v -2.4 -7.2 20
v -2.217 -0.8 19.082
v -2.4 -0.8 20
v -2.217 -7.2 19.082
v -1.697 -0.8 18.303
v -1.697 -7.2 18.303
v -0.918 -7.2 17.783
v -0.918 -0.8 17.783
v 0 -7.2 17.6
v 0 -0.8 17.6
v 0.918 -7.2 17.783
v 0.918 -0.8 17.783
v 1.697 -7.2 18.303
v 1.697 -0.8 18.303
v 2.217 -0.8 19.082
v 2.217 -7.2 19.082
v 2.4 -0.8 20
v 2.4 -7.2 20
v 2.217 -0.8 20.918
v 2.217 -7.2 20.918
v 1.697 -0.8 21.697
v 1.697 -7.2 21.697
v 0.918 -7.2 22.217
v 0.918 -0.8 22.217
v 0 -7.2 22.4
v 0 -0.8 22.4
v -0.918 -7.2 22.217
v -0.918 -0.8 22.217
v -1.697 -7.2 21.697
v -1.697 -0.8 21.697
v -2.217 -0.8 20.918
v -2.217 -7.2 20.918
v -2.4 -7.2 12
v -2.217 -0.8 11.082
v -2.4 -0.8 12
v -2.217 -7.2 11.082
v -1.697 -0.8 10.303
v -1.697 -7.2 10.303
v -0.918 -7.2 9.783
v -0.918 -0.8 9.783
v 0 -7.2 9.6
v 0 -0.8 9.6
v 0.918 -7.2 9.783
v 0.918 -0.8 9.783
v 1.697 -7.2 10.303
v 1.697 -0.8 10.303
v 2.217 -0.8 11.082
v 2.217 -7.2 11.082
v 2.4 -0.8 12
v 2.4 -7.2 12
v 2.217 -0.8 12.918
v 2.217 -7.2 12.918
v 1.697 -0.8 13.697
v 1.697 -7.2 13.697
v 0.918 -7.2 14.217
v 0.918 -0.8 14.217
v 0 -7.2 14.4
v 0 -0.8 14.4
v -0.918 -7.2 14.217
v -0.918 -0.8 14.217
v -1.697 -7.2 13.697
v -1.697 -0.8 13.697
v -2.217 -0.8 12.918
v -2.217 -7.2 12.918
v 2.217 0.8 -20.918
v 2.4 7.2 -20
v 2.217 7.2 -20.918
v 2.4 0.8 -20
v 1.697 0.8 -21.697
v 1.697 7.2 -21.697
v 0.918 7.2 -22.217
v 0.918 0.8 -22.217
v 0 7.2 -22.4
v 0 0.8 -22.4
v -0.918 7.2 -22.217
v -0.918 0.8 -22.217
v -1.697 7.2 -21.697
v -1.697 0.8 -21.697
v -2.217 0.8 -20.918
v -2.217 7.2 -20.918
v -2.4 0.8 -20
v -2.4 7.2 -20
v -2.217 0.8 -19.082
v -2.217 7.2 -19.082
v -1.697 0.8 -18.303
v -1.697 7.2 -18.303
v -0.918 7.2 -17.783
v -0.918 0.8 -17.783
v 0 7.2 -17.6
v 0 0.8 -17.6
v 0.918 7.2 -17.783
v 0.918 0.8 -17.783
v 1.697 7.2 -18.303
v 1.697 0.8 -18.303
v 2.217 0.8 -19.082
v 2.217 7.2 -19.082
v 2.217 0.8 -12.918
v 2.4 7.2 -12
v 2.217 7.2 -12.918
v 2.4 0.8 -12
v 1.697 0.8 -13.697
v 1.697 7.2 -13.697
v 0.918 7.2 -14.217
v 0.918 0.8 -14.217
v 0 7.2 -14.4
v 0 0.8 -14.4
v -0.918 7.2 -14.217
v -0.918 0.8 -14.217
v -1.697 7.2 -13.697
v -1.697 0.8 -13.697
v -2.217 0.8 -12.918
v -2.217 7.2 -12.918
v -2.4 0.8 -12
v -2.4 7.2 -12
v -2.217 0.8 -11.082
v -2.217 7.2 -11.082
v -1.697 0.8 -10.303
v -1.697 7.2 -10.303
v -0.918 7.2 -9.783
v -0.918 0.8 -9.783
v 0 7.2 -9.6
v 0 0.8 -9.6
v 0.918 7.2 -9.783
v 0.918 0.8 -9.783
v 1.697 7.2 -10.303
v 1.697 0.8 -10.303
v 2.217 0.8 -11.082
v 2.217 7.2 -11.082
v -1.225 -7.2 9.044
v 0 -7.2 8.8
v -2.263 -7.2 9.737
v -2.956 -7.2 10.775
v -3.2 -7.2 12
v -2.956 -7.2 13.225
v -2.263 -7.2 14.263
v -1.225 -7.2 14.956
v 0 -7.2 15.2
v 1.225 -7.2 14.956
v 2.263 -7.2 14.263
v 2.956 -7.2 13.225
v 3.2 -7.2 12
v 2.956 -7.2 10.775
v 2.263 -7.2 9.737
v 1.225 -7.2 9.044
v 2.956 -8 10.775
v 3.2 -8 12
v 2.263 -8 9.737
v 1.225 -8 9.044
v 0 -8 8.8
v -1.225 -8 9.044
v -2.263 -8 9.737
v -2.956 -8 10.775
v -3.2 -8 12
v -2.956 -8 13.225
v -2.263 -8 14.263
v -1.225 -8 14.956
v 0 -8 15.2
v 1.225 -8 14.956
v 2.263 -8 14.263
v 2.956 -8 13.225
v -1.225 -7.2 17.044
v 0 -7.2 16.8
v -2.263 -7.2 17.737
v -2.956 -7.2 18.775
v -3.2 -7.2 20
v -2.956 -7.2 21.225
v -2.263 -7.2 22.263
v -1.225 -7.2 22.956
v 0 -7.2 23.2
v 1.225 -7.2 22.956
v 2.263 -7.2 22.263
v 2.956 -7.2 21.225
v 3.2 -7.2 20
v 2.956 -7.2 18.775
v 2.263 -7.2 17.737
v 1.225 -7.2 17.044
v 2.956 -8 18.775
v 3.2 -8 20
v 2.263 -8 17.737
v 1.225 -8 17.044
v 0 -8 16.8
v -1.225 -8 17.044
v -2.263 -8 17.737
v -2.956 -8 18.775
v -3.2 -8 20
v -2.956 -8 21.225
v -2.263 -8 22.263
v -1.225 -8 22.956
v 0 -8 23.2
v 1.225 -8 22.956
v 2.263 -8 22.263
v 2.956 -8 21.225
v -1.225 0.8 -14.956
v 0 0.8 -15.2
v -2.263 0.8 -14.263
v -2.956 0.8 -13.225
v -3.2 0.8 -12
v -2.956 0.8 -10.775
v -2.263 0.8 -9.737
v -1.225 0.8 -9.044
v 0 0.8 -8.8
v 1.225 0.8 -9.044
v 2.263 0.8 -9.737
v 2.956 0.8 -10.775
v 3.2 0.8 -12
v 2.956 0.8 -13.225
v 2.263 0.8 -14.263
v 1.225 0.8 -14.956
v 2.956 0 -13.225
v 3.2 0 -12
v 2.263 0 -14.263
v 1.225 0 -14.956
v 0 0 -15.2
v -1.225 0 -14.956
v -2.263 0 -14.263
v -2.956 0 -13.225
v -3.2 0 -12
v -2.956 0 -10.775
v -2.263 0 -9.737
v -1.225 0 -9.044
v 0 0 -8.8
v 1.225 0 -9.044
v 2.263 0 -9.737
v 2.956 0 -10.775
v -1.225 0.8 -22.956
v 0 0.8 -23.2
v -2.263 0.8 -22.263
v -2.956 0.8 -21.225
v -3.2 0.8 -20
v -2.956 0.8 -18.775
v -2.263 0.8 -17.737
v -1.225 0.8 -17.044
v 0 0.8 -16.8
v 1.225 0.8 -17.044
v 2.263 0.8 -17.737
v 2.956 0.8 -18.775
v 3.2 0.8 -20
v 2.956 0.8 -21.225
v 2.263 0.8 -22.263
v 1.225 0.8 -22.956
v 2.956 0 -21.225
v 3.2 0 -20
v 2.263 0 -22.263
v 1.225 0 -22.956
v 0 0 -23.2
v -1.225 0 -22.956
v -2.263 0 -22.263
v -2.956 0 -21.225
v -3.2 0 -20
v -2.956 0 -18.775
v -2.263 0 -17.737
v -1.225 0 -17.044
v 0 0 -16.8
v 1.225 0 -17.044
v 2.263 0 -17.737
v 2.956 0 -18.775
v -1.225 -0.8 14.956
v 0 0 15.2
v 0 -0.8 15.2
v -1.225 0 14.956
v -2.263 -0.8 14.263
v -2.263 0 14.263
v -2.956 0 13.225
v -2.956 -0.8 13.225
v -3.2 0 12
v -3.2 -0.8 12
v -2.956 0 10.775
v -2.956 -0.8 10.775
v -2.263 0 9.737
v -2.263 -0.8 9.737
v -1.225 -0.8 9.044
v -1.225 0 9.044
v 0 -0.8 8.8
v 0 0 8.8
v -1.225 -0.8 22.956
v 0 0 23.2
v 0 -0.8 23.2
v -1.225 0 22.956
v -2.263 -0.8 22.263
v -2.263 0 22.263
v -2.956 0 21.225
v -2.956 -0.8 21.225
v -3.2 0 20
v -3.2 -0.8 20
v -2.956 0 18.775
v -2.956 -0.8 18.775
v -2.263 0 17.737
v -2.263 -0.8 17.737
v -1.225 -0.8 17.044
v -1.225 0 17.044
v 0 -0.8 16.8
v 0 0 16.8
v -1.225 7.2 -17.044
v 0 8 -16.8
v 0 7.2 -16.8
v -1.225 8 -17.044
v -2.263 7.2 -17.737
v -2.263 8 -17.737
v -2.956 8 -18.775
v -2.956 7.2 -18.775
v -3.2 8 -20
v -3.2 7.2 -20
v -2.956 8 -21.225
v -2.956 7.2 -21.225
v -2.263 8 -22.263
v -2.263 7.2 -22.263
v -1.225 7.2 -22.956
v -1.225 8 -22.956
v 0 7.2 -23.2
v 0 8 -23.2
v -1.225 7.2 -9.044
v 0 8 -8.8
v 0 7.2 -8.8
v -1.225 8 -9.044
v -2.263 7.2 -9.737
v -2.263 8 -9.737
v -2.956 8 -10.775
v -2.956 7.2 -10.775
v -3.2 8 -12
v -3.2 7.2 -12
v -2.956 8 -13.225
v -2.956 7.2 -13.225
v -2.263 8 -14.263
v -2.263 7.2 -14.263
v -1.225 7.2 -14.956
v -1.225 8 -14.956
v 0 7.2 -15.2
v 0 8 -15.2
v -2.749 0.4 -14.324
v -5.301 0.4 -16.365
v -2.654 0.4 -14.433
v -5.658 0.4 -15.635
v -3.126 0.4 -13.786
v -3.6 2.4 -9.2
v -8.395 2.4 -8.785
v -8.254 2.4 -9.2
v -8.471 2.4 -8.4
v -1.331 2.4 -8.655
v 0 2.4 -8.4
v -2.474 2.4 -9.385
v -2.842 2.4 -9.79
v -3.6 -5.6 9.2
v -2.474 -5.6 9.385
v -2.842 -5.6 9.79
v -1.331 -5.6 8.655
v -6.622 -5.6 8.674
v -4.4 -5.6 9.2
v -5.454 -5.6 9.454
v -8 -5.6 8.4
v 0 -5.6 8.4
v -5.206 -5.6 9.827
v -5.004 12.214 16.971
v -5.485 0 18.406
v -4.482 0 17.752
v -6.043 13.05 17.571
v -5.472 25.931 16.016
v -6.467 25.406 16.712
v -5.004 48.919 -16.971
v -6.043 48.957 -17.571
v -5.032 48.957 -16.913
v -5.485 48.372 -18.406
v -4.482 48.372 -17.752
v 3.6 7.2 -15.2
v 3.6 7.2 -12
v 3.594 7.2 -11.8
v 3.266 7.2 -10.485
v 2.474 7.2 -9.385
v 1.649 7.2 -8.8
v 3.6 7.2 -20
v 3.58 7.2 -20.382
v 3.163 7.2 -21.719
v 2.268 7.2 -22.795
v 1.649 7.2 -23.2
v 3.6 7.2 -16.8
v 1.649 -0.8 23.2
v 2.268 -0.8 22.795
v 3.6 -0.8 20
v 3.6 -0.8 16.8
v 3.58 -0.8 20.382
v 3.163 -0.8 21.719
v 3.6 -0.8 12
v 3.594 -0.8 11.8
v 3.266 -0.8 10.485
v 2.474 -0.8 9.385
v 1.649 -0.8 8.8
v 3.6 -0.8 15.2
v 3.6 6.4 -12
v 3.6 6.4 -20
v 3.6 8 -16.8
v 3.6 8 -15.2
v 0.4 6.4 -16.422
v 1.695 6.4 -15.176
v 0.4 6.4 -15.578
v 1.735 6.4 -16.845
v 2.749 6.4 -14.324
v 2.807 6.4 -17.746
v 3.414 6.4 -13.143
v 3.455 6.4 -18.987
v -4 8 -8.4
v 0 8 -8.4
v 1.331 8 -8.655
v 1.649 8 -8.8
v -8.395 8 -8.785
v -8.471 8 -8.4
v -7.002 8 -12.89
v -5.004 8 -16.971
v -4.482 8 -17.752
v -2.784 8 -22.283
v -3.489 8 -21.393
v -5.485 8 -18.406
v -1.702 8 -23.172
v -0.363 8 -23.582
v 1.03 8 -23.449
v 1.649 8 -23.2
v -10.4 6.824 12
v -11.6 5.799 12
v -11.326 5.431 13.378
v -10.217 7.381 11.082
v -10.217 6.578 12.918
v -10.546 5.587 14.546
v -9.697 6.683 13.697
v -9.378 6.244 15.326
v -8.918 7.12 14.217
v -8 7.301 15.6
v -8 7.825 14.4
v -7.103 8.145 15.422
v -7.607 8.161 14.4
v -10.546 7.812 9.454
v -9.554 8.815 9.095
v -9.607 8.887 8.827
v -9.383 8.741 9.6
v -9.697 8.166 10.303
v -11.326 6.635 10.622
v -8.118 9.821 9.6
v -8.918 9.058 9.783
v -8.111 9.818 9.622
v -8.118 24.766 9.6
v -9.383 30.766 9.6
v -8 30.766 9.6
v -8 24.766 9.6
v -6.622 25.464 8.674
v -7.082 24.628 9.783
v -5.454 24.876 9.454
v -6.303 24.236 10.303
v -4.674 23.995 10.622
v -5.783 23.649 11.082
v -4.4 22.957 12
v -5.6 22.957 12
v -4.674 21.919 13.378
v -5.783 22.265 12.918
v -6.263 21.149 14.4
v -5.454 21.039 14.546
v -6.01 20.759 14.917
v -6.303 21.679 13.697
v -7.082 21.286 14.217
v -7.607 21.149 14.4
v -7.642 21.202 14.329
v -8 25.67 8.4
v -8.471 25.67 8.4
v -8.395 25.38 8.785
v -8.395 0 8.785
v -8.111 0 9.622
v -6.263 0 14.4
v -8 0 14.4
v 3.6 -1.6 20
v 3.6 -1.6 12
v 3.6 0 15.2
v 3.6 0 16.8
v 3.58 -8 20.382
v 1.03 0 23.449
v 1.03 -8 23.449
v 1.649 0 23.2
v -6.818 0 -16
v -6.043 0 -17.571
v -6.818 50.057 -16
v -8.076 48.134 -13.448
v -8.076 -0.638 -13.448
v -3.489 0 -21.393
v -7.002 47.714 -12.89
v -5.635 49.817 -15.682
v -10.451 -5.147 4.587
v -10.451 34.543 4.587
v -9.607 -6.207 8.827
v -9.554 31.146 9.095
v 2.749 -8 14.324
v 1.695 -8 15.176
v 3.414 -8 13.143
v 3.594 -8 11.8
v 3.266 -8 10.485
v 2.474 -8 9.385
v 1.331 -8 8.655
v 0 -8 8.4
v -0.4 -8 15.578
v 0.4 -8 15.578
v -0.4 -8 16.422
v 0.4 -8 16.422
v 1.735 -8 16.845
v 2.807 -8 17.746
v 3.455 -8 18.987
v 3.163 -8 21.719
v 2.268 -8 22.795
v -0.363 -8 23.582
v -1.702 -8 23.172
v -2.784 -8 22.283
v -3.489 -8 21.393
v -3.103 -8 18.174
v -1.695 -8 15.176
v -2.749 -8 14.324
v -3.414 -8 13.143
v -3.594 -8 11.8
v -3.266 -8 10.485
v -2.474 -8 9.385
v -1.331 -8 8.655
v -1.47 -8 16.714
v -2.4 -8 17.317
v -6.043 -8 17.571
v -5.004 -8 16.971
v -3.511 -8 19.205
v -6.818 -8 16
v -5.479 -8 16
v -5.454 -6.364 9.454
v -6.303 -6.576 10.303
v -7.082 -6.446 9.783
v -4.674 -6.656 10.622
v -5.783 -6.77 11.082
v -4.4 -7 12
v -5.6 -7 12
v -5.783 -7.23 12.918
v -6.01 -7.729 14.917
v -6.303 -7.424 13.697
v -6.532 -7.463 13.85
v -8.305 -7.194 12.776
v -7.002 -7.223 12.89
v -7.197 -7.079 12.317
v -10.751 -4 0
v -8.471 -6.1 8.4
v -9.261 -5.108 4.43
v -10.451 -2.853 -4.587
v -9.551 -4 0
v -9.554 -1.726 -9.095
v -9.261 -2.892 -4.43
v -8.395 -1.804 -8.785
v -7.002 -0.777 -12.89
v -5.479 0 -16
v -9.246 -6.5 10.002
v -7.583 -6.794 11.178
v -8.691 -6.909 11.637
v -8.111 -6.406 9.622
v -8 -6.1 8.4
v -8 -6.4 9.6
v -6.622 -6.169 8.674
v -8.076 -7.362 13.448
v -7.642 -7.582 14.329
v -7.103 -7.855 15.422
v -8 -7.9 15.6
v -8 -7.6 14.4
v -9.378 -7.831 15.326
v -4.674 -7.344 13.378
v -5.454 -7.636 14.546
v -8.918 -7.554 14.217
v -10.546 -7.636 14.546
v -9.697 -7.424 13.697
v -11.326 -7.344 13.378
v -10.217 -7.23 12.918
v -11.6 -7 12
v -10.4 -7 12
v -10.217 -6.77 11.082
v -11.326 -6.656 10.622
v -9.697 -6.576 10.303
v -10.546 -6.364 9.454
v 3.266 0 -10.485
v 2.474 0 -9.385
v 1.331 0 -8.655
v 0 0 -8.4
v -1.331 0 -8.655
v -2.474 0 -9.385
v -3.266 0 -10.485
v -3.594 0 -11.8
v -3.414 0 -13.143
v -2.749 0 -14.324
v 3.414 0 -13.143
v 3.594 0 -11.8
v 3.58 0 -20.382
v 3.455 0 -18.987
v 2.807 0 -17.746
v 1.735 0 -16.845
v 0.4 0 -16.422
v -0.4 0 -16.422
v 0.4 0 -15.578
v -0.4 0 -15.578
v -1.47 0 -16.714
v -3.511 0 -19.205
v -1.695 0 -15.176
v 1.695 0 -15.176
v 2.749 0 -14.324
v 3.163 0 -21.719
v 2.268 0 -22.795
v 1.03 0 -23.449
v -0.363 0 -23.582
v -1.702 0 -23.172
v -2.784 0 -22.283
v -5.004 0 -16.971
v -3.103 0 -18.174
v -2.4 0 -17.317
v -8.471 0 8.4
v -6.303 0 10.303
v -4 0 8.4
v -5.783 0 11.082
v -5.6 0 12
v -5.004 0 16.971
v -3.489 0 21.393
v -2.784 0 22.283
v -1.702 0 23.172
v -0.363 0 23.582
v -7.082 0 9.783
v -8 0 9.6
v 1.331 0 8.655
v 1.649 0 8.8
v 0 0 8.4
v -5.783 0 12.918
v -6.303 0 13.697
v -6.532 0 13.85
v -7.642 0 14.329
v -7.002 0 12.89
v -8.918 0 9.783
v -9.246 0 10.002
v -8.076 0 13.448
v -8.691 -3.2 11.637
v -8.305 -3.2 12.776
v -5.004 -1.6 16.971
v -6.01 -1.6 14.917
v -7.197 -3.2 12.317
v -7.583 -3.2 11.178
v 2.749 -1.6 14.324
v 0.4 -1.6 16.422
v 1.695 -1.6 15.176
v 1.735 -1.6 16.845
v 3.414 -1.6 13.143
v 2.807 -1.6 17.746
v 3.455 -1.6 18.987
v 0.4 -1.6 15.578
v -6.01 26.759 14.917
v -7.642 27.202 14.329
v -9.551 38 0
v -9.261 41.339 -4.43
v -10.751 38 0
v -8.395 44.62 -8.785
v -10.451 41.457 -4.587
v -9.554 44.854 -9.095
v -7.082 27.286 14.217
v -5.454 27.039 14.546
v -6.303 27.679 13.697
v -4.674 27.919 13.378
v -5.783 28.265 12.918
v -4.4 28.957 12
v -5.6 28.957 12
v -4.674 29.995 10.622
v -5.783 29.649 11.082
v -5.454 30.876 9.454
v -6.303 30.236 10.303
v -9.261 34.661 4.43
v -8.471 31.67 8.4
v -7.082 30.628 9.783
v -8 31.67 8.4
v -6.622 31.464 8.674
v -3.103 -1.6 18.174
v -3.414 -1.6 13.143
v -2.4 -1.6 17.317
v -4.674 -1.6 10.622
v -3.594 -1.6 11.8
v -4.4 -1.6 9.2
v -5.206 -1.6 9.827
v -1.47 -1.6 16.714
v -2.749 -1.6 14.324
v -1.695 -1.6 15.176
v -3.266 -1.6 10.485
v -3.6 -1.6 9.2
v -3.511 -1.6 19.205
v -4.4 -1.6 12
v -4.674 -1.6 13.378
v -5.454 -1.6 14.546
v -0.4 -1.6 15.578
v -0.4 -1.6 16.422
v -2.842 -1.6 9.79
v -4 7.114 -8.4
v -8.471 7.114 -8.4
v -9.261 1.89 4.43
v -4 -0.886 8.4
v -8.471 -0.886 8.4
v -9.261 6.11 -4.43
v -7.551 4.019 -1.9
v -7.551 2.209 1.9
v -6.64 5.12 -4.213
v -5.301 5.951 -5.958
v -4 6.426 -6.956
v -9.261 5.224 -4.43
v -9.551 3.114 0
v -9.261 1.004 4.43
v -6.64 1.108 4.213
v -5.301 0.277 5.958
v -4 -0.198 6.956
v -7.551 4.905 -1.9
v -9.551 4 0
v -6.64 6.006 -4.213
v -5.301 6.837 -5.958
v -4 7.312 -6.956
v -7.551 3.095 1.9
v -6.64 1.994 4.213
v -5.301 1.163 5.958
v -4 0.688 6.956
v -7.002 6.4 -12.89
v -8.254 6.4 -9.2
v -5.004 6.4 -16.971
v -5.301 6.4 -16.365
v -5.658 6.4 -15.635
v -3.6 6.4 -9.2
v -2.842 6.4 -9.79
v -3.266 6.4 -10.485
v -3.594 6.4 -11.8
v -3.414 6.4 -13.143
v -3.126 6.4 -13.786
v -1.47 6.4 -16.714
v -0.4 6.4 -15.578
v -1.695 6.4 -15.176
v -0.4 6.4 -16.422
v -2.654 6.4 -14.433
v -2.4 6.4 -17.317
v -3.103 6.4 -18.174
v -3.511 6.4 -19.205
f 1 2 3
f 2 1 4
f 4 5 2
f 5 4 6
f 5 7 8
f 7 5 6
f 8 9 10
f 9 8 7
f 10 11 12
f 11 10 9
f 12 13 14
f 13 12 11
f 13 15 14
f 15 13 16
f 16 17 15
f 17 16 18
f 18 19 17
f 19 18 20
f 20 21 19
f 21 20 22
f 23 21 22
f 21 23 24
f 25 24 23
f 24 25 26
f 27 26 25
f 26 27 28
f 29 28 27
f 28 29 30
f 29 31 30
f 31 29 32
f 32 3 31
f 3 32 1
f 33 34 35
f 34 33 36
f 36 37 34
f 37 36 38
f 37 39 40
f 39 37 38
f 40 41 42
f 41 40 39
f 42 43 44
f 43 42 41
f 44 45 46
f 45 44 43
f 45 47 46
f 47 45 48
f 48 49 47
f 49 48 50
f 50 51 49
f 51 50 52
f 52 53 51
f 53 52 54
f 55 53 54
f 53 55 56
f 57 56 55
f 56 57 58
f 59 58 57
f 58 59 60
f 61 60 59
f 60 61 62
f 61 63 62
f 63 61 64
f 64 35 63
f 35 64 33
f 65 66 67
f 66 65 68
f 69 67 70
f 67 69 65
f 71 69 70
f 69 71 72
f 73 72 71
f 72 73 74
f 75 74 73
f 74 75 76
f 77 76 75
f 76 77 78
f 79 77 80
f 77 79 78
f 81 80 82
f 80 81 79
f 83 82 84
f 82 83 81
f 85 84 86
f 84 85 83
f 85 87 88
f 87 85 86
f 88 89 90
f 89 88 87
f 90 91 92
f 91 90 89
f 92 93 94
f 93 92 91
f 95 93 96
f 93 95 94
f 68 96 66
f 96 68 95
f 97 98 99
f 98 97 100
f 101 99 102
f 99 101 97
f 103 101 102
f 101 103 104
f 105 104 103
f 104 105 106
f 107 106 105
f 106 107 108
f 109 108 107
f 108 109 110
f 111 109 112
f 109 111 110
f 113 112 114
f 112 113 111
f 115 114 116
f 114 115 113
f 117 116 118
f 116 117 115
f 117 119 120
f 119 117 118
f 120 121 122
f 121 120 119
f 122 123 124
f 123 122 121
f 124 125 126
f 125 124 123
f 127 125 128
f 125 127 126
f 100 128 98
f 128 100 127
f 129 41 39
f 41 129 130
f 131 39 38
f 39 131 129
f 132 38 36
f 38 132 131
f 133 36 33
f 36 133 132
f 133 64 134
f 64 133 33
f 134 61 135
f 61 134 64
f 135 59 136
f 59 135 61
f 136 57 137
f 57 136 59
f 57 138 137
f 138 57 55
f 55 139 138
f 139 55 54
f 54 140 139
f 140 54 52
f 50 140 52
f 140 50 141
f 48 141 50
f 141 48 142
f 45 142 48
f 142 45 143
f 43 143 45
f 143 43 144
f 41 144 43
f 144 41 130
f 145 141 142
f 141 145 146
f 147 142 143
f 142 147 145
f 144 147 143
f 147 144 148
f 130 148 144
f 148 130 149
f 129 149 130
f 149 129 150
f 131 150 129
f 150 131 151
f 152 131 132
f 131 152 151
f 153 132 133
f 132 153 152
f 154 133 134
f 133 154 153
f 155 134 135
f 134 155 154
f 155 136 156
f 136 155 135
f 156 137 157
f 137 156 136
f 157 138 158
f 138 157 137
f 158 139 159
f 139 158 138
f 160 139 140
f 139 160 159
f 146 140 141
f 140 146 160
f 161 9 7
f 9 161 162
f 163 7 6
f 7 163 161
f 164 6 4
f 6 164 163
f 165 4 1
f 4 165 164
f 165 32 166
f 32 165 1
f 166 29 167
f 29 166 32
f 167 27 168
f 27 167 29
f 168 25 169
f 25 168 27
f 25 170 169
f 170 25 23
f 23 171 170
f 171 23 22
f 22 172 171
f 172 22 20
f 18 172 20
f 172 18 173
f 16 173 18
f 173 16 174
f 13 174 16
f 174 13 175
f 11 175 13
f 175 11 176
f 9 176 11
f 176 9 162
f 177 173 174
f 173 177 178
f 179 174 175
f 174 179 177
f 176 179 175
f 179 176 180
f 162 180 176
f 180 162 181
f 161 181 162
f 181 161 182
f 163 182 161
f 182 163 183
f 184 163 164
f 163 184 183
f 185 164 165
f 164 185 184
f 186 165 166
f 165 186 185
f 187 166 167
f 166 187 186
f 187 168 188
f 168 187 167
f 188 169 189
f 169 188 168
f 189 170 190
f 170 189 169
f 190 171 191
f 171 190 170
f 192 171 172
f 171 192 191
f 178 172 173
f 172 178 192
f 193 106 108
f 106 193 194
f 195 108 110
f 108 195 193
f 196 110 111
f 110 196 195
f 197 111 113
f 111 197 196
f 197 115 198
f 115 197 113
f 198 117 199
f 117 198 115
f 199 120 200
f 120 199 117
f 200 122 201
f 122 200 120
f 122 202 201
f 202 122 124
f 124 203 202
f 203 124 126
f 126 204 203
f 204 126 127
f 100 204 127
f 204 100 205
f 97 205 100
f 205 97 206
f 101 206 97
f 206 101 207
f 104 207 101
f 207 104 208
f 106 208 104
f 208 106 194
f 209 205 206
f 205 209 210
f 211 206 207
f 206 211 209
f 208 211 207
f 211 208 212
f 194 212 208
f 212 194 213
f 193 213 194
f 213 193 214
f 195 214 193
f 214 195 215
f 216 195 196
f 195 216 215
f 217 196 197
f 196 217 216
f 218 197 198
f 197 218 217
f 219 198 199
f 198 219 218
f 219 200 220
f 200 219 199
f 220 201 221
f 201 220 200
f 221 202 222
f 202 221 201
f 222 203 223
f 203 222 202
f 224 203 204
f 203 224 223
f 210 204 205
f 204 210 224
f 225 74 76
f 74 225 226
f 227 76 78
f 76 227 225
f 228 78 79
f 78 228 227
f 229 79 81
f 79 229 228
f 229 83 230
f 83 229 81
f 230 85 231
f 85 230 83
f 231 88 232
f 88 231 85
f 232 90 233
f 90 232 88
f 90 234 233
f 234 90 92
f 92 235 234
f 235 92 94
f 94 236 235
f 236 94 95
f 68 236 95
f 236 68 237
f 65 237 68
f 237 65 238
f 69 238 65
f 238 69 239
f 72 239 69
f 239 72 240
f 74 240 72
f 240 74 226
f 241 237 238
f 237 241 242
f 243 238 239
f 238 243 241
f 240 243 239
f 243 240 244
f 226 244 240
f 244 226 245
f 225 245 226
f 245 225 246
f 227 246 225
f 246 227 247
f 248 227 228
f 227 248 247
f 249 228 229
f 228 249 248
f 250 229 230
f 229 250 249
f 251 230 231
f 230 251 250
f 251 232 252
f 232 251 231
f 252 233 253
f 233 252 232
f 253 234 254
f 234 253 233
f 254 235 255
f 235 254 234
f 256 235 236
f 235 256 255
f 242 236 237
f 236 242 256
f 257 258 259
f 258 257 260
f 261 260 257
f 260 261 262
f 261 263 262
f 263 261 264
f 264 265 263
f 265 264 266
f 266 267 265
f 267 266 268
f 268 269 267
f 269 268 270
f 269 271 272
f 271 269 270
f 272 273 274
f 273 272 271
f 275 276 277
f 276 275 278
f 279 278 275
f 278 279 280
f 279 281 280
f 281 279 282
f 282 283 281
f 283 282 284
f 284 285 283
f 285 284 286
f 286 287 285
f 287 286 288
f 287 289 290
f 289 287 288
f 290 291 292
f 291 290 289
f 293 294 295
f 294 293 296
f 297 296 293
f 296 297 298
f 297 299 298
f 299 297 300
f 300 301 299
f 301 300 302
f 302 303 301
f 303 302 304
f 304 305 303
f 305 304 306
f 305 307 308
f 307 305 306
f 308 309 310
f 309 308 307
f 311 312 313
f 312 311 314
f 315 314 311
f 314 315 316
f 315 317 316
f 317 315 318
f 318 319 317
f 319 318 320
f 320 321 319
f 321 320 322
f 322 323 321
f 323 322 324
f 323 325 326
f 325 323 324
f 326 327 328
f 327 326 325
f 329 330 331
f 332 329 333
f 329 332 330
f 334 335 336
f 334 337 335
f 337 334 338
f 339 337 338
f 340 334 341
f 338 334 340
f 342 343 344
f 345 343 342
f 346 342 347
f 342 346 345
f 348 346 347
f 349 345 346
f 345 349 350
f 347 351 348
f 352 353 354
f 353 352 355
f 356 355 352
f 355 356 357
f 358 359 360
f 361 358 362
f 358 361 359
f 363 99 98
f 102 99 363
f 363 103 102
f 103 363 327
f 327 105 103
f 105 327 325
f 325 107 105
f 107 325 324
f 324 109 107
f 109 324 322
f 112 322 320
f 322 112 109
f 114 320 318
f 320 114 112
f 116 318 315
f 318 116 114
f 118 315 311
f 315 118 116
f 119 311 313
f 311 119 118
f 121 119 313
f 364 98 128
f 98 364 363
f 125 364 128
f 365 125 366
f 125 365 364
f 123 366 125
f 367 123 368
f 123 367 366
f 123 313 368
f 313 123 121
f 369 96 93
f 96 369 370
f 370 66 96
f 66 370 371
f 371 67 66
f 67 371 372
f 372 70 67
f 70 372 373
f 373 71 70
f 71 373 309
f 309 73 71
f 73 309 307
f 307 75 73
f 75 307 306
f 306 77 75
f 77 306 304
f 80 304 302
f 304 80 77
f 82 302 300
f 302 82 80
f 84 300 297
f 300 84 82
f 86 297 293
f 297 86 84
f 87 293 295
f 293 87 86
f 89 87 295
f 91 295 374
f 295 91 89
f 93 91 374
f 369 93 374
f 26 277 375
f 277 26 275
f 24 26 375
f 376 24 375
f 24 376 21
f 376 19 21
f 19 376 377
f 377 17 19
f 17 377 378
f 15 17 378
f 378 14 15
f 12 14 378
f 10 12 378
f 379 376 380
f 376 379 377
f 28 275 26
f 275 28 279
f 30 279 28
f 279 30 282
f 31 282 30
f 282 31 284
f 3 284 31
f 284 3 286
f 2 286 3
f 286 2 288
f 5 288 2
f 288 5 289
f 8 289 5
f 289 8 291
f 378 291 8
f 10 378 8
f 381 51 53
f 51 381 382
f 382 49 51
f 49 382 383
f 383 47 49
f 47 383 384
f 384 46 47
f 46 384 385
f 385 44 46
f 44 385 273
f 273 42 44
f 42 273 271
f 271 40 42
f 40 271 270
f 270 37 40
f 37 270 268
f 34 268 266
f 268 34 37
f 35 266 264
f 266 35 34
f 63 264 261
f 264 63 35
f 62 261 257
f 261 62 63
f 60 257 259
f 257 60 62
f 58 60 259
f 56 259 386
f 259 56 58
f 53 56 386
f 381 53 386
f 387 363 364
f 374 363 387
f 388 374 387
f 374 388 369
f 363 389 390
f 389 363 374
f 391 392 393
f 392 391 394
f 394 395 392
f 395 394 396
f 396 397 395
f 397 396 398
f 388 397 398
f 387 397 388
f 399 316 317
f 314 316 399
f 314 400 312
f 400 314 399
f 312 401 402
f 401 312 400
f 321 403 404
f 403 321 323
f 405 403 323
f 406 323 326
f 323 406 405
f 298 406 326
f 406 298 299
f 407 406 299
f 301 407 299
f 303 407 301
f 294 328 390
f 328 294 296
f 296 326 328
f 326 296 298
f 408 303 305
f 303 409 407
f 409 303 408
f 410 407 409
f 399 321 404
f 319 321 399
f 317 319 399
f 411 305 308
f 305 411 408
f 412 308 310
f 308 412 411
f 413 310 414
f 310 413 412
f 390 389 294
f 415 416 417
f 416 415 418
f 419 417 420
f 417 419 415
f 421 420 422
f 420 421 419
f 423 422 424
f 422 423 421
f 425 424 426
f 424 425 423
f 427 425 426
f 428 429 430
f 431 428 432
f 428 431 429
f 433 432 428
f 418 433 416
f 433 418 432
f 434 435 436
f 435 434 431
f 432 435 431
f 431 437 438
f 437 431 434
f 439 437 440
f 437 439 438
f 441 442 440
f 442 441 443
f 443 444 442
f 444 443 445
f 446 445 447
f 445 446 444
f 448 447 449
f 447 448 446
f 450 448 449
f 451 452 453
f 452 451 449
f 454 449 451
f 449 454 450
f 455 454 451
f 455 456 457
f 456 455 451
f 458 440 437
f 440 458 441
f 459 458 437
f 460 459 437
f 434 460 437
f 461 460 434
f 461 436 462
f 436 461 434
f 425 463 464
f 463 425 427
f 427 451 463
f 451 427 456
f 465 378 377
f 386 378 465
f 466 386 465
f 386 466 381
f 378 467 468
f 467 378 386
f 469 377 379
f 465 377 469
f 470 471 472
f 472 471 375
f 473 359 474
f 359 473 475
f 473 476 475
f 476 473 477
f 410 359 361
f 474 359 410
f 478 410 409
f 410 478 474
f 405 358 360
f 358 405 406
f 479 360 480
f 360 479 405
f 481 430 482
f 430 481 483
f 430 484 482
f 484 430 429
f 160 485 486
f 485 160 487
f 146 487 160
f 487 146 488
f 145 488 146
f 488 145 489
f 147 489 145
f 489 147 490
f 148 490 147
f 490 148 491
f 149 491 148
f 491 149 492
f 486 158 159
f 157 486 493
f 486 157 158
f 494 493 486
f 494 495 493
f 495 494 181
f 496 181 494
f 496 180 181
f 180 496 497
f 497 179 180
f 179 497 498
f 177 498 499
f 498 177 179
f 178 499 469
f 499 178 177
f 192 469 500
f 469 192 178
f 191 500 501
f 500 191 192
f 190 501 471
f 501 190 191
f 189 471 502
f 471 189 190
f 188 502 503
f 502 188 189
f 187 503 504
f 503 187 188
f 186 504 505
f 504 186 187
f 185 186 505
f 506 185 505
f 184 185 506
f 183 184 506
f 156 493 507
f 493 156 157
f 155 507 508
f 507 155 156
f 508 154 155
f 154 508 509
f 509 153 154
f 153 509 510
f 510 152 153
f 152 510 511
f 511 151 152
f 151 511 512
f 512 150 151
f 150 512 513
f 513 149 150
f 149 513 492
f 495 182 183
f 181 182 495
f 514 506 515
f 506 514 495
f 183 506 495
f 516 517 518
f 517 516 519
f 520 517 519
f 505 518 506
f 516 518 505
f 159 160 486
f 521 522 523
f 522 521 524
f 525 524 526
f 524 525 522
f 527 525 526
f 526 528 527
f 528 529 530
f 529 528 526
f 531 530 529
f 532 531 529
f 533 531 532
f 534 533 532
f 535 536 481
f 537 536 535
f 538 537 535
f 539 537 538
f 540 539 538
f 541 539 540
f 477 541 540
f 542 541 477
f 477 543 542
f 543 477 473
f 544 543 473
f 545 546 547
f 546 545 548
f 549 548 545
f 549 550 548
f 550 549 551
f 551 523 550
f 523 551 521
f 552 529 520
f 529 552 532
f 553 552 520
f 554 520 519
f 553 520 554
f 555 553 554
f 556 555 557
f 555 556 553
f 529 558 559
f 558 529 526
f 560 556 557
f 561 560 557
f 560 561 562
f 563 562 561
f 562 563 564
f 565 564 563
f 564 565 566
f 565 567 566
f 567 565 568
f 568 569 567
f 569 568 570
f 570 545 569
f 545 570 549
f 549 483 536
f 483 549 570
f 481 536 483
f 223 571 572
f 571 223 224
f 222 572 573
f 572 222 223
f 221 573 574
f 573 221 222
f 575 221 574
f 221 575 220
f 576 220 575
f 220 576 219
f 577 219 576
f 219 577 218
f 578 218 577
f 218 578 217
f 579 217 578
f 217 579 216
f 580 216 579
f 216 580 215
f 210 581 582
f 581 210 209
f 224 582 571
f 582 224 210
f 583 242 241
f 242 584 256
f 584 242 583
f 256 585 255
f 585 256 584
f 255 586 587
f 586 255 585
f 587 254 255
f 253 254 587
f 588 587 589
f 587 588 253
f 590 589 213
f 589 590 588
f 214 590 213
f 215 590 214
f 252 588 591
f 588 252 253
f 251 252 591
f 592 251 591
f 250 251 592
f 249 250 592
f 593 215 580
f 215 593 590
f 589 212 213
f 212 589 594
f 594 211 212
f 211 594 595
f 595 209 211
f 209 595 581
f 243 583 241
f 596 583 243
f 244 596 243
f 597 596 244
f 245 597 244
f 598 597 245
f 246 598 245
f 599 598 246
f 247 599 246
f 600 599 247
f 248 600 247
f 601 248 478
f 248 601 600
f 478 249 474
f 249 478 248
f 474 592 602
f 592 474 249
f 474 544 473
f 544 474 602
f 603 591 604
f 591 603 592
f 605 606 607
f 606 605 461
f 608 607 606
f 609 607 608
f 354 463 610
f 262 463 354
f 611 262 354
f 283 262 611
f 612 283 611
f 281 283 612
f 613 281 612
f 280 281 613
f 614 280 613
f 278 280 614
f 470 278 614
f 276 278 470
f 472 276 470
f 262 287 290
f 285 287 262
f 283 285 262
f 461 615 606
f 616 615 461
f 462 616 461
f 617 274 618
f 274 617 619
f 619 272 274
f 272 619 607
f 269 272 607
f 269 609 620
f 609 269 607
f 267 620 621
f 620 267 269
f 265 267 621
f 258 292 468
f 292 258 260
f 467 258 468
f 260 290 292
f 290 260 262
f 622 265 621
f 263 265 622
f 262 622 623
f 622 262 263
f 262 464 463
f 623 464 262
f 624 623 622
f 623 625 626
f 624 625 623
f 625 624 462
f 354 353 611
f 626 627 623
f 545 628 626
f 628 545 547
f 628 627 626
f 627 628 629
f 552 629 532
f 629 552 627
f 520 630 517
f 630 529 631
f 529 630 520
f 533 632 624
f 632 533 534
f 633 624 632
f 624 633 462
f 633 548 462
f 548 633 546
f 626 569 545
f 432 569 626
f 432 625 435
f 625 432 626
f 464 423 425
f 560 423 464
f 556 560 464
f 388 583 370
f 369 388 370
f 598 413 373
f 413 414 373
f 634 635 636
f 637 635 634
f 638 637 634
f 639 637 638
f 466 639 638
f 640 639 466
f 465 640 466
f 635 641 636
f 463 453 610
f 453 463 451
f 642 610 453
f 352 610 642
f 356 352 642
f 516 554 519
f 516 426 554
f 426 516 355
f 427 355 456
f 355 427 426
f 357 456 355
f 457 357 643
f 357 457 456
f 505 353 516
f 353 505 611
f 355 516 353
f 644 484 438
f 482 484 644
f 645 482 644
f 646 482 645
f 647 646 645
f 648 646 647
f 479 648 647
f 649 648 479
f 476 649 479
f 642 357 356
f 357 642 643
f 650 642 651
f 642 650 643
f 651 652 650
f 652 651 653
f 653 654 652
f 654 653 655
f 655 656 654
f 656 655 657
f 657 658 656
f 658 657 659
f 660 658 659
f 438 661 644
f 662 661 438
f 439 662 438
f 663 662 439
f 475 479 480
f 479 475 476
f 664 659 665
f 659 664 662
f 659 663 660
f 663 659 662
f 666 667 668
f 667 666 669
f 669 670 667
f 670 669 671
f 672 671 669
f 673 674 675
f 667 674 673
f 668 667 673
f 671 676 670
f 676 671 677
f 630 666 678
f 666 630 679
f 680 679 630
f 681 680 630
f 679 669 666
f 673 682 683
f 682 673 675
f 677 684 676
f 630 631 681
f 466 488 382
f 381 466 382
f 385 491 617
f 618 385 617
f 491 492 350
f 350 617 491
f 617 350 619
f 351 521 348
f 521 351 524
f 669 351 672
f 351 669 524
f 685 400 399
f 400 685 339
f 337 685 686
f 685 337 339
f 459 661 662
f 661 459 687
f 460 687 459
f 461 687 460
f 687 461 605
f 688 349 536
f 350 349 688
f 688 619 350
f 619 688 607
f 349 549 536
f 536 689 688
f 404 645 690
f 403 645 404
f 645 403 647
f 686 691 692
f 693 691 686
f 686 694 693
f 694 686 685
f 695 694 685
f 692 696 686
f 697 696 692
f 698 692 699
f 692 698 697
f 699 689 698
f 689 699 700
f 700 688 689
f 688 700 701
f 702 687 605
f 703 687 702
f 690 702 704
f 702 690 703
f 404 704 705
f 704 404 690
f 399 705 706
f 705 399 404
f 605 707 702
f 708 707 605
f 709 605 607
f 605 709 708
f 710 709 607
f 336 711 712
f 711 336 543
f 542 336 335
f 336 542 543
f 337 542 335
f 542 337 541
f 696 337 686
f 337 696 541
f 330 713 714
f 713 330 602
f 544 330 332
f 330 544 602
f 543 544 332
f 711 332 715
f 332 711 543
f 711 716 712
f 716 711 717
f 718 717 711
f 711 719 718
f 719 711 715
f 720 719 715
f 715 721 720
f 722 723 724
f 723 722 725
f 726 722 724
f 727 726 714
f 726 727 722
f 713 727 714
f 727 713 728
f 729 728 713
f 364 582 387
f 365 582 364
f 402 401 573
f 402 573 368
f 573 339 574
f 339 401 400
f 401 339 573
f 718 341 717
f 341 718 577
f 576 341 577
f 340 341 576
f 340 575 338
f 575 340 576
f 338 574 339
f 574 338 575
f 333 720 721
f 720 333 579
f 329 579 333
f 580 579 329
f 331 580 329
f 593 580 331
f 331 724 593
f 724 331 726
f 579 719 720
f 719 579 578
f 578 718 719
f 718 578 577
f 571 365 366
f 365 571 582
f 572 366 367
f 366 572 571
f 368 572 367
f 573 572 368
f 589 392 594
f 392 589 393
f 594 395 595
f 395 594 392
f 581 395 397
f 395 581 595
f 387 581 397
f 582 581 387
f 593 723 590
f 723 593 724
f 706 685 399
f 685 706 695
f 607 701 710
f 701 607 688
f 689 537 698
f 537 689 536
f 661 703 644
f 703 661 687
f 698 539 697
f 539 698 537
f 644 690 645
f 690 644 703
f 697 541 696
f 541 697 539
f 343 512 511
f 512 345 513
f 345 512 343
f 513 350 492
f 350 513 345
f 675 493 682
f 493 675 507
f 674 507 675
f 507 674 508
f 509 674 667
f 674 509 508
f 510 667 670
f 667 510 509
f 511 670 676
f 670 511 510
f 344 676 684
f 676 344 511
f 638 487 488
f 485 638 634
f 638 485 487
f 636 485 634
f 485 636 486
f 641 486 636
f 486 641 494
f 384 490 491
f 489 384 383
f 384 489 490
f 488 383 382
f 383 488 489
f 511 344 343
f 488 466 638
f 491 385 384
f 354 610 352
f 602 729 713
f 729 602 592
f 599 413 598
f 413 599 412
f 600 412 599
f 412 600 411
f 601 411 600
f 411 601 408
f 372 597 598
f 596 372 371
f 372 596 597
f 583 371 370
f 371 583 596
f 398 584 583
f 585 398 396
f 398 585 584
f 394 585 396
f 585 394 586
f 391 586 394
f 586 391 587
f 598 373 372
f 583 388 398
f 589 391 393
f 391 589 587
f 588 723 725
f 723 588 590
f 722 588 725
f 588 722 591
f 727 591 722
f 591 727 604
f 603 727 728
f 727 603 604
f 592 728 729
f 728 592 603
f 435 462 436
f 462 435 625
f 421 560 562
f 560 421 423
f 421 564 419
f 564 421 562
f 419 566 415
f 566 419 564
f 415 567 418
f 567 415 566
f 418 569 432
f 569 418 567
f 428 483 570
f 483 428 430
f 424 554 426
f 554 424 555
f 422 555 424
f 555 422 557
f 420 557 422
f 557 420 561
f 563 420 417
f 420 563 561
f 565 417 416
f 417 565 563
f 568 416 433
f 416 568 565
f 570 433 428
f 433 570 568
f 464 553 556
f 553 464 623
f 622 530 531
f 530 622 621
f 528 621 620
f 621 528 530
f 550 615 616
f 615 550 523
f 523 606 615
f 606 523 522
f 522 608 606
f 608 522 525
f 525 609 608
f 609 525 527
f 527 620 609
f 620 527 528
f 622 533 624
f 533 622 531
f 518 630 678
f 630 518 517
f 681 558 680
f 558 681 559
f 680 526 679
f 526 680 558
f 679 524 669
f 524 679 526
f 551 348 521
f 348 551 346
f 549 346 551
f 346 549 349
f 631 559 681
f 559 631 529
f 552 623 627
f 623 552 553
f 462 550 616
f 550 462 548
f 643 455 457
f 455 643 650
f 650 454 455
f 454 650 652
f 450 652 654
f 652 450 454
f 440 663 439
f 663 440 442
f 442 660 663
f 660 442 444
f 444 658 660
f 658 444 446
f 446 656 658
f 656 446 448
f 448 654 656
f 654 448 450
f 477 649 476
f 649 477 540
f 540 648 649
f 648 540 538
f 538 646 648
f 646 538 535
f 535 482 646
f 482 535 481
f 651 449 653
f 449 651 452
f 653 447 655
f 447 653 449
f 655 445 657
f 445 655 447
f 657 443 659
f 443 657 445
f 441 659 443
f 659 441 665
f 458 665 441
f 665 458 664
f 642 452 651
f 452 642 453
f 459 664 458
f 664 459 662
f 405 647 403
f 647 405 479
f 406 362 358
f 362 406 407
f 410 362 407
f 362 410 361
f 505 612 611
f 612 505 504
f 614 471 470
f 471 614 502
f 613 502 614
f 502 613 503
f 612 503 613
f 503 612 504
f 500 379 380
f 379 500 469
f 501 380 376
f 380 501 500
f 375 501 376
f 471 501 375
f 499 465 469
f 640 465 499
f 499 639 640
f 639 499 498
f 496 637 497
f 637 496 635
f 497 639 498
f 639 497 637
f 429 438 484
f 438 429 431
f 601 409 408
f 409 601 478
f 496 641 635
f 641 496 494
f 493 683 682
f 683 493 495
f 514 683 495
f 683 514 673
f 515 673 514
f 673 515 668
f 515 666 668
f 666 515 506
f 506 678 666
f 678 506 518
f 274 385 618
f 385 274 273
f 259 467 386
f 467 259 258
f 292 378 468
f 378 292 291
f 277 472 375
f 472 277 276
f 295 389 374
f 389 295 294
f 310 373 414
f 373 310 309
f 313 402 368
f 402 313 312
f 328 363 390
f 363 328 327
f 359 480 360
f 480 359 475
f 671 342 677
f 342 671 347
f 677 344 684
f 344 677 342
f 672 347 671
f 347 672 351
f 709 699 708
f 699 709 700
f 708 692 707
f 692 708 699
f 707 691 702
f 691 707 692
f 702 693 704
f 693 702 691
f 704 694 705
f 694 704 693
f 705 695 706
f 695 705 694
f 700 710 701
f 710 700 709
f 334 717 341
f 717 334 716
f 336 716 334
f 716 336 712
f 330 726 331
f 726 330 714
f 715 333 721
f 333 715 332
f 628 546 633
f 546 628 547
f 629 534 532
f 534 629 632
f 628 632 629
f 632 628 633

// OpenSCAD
use <../lib.scad>
use <44353.scad>
function ldraw_lib__44352() = [
// 0 Technic Panel Fairing #22
// 0 Name: 44352.dat
// 0 Author: Marc Klein [marckl]
// 0 !LDRAW_ORG Part UPDATE 2009-03
// 0 !LICENSE Licensed under CC BY 4.0 : see CAreadme.txt
// 
// 0 BFC CERTIFY CCW
  [0,"BFC","CERTIFY"],
  [0,"BFC","CCW"],
// 
// 0 !HISTORY 2009-12-29 [PTadmin] Official Update 2009-03
// 
// 
// 1 16 0 0 0 -1 0 0 0 1 0 0 0 1 44353.dat
  [1,16,0,0,0,-1,0,0,0,1,0,0,0,1, ldraw_lib__44353()],
// 0
];
module ldraw_lib__44352(step=0, col=false, unit=2/5, alt=false, line=0.2, solid=!$preview)
    makepoly(ldraw_lib__44352(), step=step, col=col, unit=unit, alt=alt, line=line, solid=solid);
ldraw_lib__44352(line=0.2);
